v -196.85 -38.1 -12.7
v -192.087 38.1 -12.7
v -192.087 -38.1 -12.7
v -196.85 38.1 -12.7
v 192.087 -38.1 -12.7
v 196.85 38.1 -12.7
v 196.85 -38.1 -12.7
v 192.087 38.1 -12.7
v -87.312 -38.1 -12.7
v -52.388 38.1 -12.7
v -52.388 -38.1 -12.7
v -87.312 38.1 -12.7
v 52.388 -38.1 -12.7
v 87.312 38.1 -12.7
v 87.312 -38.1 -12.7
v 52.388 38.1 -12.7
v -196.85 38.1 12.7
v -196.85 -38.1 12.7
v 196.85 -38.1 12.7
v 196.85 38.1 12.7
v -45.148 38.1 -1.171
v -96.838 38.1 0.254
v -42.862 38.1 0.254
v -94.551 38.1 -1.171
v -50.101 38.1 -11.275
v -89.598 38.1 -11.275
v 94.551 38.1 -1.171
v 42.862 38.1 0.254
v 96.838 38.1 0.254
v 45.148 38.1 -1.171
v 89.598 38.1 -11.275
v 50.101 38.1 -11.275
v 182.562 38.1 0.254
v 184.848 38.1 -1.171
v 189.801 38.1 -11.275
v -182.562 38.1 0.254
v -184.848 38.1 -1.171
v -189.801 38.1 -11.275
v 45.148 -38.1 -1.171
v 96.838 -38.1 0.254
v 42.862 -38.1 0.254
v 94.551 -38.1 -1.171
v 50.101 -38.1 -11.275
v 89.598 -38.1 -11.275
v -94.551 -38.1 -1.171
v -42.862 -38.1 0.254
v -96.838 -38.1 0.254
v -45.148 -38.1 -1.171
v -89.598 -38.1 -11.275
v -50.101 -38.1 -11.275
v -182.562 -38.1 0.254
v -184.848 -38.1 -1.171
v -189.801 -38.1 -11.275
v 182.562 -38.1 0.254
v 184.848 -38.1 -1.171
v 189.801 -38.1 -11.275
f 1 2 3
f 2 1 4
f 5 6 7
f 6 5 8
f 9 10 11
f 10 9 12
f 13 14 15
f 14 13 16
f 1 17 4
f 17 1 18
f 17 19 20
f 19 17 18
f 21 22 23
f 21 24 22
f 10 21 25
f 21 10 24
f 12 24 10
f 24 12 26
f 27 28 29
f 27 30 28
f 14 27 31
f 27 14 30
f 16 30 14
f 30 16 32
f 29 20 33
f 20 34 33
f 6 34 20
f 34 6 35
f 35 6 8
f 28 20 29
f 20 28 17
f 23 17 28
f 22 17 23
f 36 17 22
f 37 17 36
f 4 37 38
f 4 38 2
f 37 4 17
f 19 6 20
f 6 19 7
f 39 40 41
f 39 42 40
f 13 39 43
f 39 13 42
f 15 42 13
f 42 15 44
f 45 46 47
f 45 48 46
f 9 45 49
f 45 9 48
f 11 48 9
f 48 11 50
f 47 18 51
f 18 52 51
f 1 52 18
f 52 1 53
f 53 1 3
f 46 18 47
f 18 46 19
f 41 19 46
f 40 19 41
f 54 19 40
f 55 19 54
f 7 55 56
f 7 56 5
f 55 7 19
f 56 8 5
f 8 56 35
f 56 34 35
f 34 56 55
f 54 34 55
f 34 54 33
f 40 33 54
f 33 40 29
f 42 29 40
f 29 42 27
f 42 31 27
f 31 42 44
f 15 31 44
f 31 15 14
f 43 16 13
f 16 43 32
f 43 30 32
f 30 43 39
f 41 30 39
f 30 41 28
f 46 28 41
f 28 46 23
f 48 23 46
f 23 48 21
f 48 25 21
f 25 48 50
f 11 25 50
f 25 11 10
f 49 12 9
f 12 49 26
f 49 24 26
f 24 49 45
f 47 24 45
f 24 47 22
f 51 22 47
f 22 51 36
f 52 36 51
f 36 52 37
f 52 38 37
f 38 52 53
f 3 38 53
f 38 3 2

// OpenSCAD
// file: bolt_pattern.scad
// =============================================================================
// bolt_pattern.scad
//
// Bolt-hole cutter modules. Each generates a set of vertical through-hole
// cylinders you subtract from an adapter body. Fully self-contained: no
// dependency on adapter geometry beyond the enable flag and pass-through
// dimensions.
//
// Every adapter honors a top-level `bolt_holes = false` variable; when set
// true, the adapter subtracts the matching bolt pattern in a difference()
// pass. Leave the flag off (the default) and this file has zero effect --
// the geometry is byte-identical to the pre-bolt-holes version.
// =============================================================================

bolt_eps = 0.010;                        // face-clearing overlap on each end

// Centered vertically around z=0; caller sizes h to span the adapter.
module bolt_cyl(d, h) {
    translate([0, 0, -h/2])
        cylinder(h = h, d = d, $fn = 32);
}

// n bolts evenly spaced on a bolt circle of diameter pcd.
module circular_bolt_pattern(n, pcd, hole_d, h, angle_offset = 0) {
    for (i = [0 : n-1]) {
        a = angle_offset + i * 360 / n;
        translate([pcd/2 * cos(a), pcd/2 * sin(a), 0])
            bolt_cyl(hole_d, h);
    }
}

// Bolts around the perimeter of a rectangle: corners are always included,
// with n_per_side controlling total bolts on each edge (corners shared
// between the two edges they touch, so n_per_side = 2 gives 4 total,
// n_per_side = 3 gives 8, n_per_side = 4 gives 12, etc.).
module rectangular_bolt_pattern(outer_x, outer_y, n_per_side, edge_inset, hole_d, h) {
    ex = outer_x / 2 - edge_inset;
    ey = outer_y / 2 - edge_inset;

    for (p = [[+ex, +ey], [-ex, +ey], [+ex, -ey], [-ex, -ey]])
        translate([p[0], p[1], 0]) bolt_cyl(hole_d, h);

    if (n_per_side >= 3) {
        for (i = [1 : n_per_side - 2]) {
            x = -ex + i * (2 * ex) / (n_per_side - 1);
            y = -ey + i * (2 * ey) / (n_per_side - 1);
            translate([x, +ey, 0]) bolt_cyl(hole_d, h);
            translate([x, -ey, 0]) bolt_cyl(hole_d, h);
            translate([+ex, y, 0]) bolt_cyl(hole_d, h);
            translate([-ex, y, 0]) bolt_cyl(hole_d, h);
        }
    }
}

// n evenly-spaced bolts on the centerline of a strip of length strip_x.
module strip_bolt_pattern(strip_x, n, edge_inset, hole_d, h) {
    xs = n == 1 ? [0]
        : [ for (i = [0 : n-1]) -strip_x/2 + edge_inset + i * (strip_x - 2*edge_inset) / (n - 1) ];
    for (x = xs)
        translate([x, 0, 0]) bolt_cyl(hole_d, h);
}

// Drop a bolt at each X in xs, on the strip centerline (y=0).
module bolt_column_at(xs, hole_d, h) {
    for (x = xs)
        translate([x, 0, 0]) bolt_cyl(hole_d, h);
}
// file: corrugated_roof.scad
// =============================================================================
// corrugated_roof.scad
//
// Parametric model of a periodic sinusoidal "corrugated" sheet-metal roof --
// the classic wavy metal panel seen on sheds, barns, and some industrial
// vehicles. Signature-compatible with trapezoidal_roof.scad's cutter so the
// adapters can dispatch between the two at render time.
//
// Exports:
//     module corrugated_roof_cutter(...)  - solid block on one side of the
//                                           roof surface, sized for
//                                           subtraction from a blank.
//     module corrugated_roof_sheet(...)   - thin sheet-metal-like
//                                           visualization of the roof.
//
// The trapezoidal file owns `sheet_thickness` (and `corner_r`); this file
// only declares corrugated-specific variables so both can be `include`d in
// the same adapter without collisions.
// =============================================================================

// -----------------------------------------------------------------------------
// Corrugated cross-section defaults (inches). Overridable via -D.
// -----------------------------------------------------------------------------
corr_pitch = 2.667;    // rib-to-rib spacing (one full wave, "wavelength")
corr_depth = 0.500;    // peak-to-trough vertical distance

// Derived
corr_indent_center_x = corr_pitch / 2;   // half-wavelength from a peak = trough centerline

// =============================================================================
// corrugated_roof_cutter(flange_offset_x, pitch, depth, cut_xy, cut_z, side,
//                       thickness, samples_per_pitch)
//
// See trapezoidal_roof_cutter for parameter semantics. `flange_offset_x = 0`
// puts a peak (rib) at X = 0; `flange_offset_x = corr_indent_center_x` puts a
// trough (indent) at X = 0.
// =============================================================================
module corrugated_roof_cutter(
    flange_offset_x      = 0,
    pitch             = corr_pitch,
    depth             = corr_depth,
    cut_xy            = 40,
    cut_z             = 5,
    side              = "top",
    thickness         = 0.032,
    samples_per_pitch = 64,
    tolerance         = 0
) {
    z_shift = (side == "bottom") ? -thickness : 0;
    // top_y is the tiny above-plateau overlap baked into the profile; used
    // here as the plateau reference line for the tolerance clip.
    top_y = 0.010;
    translate([0, 0, z_shift])
        rotate([90, 0, 0])
            linear_extrude(height = 2*cut_xy, center = true)
                if (tolerance <= 0) {
                    corrugated_roof_profile_2d(
                        flange_offset_x      = flange_offset_x,
                        pitch             = pitch,
                        depth             = depth,
                        cut_xy            = cut_xy,
                        cut_z             = cut_z,
                        side              = side,
                        samples_per_pitch = samples_per_pitch
                    );
                } else {
                    // Grow the cutter uniformly by `tolerance` normal to the
                    // surface, then clip so the peak contact line stays put
                    // -- otherwise the flange would float `tolerance` above
                    // the wave crests.
                    intersection() {
                        offset(delta = tolerance)
                            corrugated_roof_profile_2d(
                                flange_offset_x      = flange_offset_x,
                                pitch             = pitch,
                                depth             = depth,
                                cut_xy            = cut_xy,
                                cut_z             = cut_z,
                                side              = side,
                                samples_per_pitch = samples_per_pitch
                            );
                        if (side == "top")
                            translate([-2*cut_xy, -2*cut_z])
                                square([4*cut_xy, 2*cut_z + top_y]);
                        else
                            translate([-2*cut_xy, top_y])
                                square([4*cut_xy, 4*cut_z]);
                    }
                }
}

// The 2D cross-section of the cutter. `y = top_y` at the peak (rib plateau
// level, at Z = 0 after the extrude/rotate) and `y = top_y - depth` at the
// trough. Enough samples per wavelength that the polygon reads as a smooth
// curve after linear_extrude.
module corrugated_roof_profile_2d(
    flange_offset_x,
    pitch,
    depth,
    cut_xy,
    cut_z,
    side              = "top",
    samples_per_pitch = 64
) {
    top_y   = 0.010;              // small overlap above the rib plateau, matches trapezoidal
    amp     = depth / 2;          // half of peak-to-trough
    total_x = 2 * cut_xy;
    n       = max(2, ceil(total_x / pitch * samples_per_pitch));
    step    = total_x / n;

    // z(x) = top_y - amp + amp*cos(...) so peaks touch top_y and troughs sit at top_y - depth.
    surface_ltr = [
        for (i = [0 : n])
            let (x = -cut_xy + i * step)
            [x, top_y - amp + amp * cos(360 * (x - flange_offset_x) / pitch)]
    ];

    pts = (side == "top")
        ? concat(
            [[-cut_xy, -cut_z], [+cut_xy, -cut_z]],
            [ for (i = [n : -1 : 0]) surface_ltr[i] ]
        )
        : concat(
            [[+cut_xy, +cut_z], [-cut_xy, +cut_z]],
            surface_ltr
        );

    polygon(pts);
}

// =============================================================================
// corrugated_roof_sheet(...)
//
// Thin sheet-metal visualization of the roof. Same top surface as
// corrugated_roof_cutter, closed to a bottom offset down by `sheet_thickness`.
// =============================================================================
module corrugated_roof_sheet(
    flange_offset_x      = 0,
    pitch             = corr_pitch,
    depth             = corr_depth,
    cut_xy            = 12,
    sheet_thickness   = 0.100,     // visualization thickness; not physically accurate
    samples_per_pitch = 64
) {
    rotate([90, 0, 0])
        linear_extrude(height = 2*cut_xy, center = true)
            corrugated_roof_sheet_2d(
                flange_offset_x      = flange_offset_x,
                pitch             = pitch,
                depth             = depth,
                cut_xy            = cut_xy,
                sheet_thickness   = sheet_thickness,
                samples_per_pitch = samples_per_pitch
            );
}

module corrugated_roof_sheet_2d(
    flange_offset_x,
    pitch,
    depth,
    cut_xy,
    sheet_thickness,
    samples_per_pitch = 64
) {
    top_y   = 0.010;
    amp     = depth / 2;
    total_x = 2 * cut_xy;
    n       = max(2, ceil(total_x / pitch * samples_per_pitch));
    step    = total_x / n;

    top_ltr = [
        for (i = [0 : n])
            let (x = -cut_xy + i * step)
            [x, top_y - amp + amp * cos(360 * (x - flange_offset_x) / pitch)]
    ];
    // Bottom face parallels the top by shifting each Y down by sheet_thickness.
    bot_rtl = [ for (i = [n : -1 : 0]) [ top_ltr[i][0], top_ltr[i][1] - sheet_thickness ] ];

    polygon(concat(top_ltr, bot_rtl));
}
// main file
// =============================================================================
// strip.scad
//
// A rectangular mounting strip that conforms to a periodic trapezoidal-rib
// roof (see trapezoidal_roof.scad). Structurally the same as
// rectangular_adapter.scad minus the inner cutout -- a solid bar that spans
// the ribs, suitable for roof-rack rails, panel mount bases, cable
// tie-downs, etc.
//
// Topside and underside variants are the two halves of a single prism split
// along the roof surface -- see circular_adapter.scad for the full explanation.
//
// All dimensions in inches; final scale converts to millimeters.
// =============================================================================

include <trapezoidal_roof.scad>
include <corrugated_roof.scad>
include <bolt_pattern.scad>

// -----------------------------------------------------------------------------
// Roof profile
// -----------------------------------------------------------------------------
roof_profile = "trapezoidal";            // "trapezoidal" or "corrugated"
roof_depth   = (roof_profile == "corrugated") ? corr_depth : indent_depth;

// -----------------------------------------------------------------------------
// Strip shape
// -----------------------------------------------------------------------------
strip_x     = 15.500;                     // length across ribs (X)
strip_y     = 3.000;                      // width along ribs (Y)
main_thick  = roof_depth;                 // thickness above/below the rib plateau plane

// -----------------------------------------------------------------------------
// Position on the roof and which side it mounts on
// -----------------------------------------------------------------------------
flange_offset_x = 0;                         // 0 = rib-centered; indent_center_x = indent-centered
side         = "top";                     // "top" (outside), "bottom" (inside), or "both" (both sides side by side)

// -----------------------------------------------------------------------------
// Fit tolerance: uniform clearance normal to the roof surface. Grows the
// cutter (via offset() before extrusion) so the printed pads sit in the
// real indents with slop instead of an exact-fit wedge. The plateau contact
// line is preserved via an intersection clip -- see trapezoidal_roof.scad.
// -----------------------------------------------------------------------------
tolerance   = 0;                          // per-side clearance around the roof-mating features

// -----------------------------------------------------------------------------
// Bolt holes (opt-in). See bolt_pattern.scad.
// -----------------------------------------------------------------------------
bolt_holes  = false;                      // set true to subtract a bolt pattern
bolt_place  = "ribs";                     // "ribs", "indents", "both",
                                          //   "every-other-rib", "every-other-indent"
bolt_hole_d = 0.250;                      // through-hole diameter

// -----------------------------------------------------------------------------
// Render controls
// -----------------------------------------------------------------------------
$fn    = 240;
IN2MM  = 25.4;

// -----------------------------------------------------------------------------
// Derived cutter extents (Z range computed per-side inside the module).
// -----------------------------------------------------------------------------
cut_xy = 2 * max(strip_x, strip_y);
cut_z  = 4 * roof_depth;

scale([IN2MM, IN2MM, IN2MM]) render_all();

// =============================================================================
// Modules
// =============================================================================

module render_all() {
    if (side == "both") {
        // Strip is long in X; stack the two pieces along Y so the print bed
        // layout stays compact.
        gap = strip_y * 1.5;
        translate([0, -gap/2, 0]) strip("top");
        translate([0, +gap/2, 0]) strip("bottom");
    } else {
        strip(side);
    }
}

module strip(s = side) {
    z_top = (s == "top") ? +main_thick    : -sheet_thickness;
    z_bot = (s == "top") ? -roof_depth    : -main_thick - roof_depth - sheet_thickness;
    difference() {
        translate([0, 0, z_bot])
            linear_extrude(height = z_top - z_bot)
                square([strip_x, strip_y], center = true);
        roof_cutter(s);
        if (bolt_holes)
            bolt_column_at(
                strip_bolt_xs(),
                bolt_hole_d,
                4 * (main_thick + roof_depth + sheet_thickness)
            );
    }
}

// Roof pitch and feature widths for the currently-selected profile.
function _strip_pitch()    = (roof_profile == "corrugated") ? corr_pitch : roof_pitch;
function _strip_rib_w()    = (roof_profile == "corrugated") ? corr_pitch / 2 : rib_width;
function _strip_indent_w() = (roof_profile == "corrugated") ? corr_pitch / 2 : indent_top_w;
function _strip_indent_offset() =
    (roof_profile == "corrugated") ? corr_indent_center_x : indent_center_x;

// Include a feature centered at x only if at least half its width falls
// within the strip -- skips the partial rib/indent that gets clipped at
// either end.
function _feature_qualifies(x, w) =
    let (inside = min(x + w/2, strip_x/2) - max(x - w/2, -strip_x/2))
    inside >= w/2;

function _strip_rib_xs() =
    let (p = _strip_pitch(), w = _strip_rib_w(), n = ceil(strip_x / p) + 1)
    [ for (k = [-n : n])
        let (x = k * p - flange_offset_x)
        if (_feature_qualifies(x, w)) x ];

function _strip_indent_xs() =
    let (p = _strip_pitch(), w = _strip_indent_w(), off = _strip_indent_offset(),
         n = ceil(strip_x / p) + 1)
    [ for (k = [-n : n])
        let (x = off + k * p - flange_offset_x)
        if (_feature_qualifies(x, w)) x ];

function _every_other(xs) = [ for (i = [0 : 2 : len(xs) - 1]) xs[i] ];

function strip_bolt_xs() =
      bolt_place == "indents"            ? _strip_indent_xs()
    : bolt_place == "both"               ? concat(_strip_rib_xs(), _strip_indent_xs())
    : bolt_place == "every-other-rib"    ? _every_other(_strip_rib_xs())
    : bolt_place == "every-other-indent" ? _every_other(_strip_indent_xs())
    : _strip_rib_xs();

module roof_cutter(s = side) {
    if (roof_profile == "corrugated")
        corrugated_roof_cutter(
            flange_offset_x = flange_offset_x,
            pitch        = corr_pitch,
            depth        = corr_depth,
            cut_xy       = cut_xy,
            cut_z        = cut_z,
            side         = s,
            thickness    = sheet_thickness,
            tolerance    = tolerance
        );
    else
        trapezoidal_roof_cutter(
            flange_offset_x = flange_offset_x,
            cut_xy       = cut_xy,
            cut_z        = cut_z,
            side         = s,
            thickness    = sheet_thickness,
            tolerance    = tolerance
        );
}
